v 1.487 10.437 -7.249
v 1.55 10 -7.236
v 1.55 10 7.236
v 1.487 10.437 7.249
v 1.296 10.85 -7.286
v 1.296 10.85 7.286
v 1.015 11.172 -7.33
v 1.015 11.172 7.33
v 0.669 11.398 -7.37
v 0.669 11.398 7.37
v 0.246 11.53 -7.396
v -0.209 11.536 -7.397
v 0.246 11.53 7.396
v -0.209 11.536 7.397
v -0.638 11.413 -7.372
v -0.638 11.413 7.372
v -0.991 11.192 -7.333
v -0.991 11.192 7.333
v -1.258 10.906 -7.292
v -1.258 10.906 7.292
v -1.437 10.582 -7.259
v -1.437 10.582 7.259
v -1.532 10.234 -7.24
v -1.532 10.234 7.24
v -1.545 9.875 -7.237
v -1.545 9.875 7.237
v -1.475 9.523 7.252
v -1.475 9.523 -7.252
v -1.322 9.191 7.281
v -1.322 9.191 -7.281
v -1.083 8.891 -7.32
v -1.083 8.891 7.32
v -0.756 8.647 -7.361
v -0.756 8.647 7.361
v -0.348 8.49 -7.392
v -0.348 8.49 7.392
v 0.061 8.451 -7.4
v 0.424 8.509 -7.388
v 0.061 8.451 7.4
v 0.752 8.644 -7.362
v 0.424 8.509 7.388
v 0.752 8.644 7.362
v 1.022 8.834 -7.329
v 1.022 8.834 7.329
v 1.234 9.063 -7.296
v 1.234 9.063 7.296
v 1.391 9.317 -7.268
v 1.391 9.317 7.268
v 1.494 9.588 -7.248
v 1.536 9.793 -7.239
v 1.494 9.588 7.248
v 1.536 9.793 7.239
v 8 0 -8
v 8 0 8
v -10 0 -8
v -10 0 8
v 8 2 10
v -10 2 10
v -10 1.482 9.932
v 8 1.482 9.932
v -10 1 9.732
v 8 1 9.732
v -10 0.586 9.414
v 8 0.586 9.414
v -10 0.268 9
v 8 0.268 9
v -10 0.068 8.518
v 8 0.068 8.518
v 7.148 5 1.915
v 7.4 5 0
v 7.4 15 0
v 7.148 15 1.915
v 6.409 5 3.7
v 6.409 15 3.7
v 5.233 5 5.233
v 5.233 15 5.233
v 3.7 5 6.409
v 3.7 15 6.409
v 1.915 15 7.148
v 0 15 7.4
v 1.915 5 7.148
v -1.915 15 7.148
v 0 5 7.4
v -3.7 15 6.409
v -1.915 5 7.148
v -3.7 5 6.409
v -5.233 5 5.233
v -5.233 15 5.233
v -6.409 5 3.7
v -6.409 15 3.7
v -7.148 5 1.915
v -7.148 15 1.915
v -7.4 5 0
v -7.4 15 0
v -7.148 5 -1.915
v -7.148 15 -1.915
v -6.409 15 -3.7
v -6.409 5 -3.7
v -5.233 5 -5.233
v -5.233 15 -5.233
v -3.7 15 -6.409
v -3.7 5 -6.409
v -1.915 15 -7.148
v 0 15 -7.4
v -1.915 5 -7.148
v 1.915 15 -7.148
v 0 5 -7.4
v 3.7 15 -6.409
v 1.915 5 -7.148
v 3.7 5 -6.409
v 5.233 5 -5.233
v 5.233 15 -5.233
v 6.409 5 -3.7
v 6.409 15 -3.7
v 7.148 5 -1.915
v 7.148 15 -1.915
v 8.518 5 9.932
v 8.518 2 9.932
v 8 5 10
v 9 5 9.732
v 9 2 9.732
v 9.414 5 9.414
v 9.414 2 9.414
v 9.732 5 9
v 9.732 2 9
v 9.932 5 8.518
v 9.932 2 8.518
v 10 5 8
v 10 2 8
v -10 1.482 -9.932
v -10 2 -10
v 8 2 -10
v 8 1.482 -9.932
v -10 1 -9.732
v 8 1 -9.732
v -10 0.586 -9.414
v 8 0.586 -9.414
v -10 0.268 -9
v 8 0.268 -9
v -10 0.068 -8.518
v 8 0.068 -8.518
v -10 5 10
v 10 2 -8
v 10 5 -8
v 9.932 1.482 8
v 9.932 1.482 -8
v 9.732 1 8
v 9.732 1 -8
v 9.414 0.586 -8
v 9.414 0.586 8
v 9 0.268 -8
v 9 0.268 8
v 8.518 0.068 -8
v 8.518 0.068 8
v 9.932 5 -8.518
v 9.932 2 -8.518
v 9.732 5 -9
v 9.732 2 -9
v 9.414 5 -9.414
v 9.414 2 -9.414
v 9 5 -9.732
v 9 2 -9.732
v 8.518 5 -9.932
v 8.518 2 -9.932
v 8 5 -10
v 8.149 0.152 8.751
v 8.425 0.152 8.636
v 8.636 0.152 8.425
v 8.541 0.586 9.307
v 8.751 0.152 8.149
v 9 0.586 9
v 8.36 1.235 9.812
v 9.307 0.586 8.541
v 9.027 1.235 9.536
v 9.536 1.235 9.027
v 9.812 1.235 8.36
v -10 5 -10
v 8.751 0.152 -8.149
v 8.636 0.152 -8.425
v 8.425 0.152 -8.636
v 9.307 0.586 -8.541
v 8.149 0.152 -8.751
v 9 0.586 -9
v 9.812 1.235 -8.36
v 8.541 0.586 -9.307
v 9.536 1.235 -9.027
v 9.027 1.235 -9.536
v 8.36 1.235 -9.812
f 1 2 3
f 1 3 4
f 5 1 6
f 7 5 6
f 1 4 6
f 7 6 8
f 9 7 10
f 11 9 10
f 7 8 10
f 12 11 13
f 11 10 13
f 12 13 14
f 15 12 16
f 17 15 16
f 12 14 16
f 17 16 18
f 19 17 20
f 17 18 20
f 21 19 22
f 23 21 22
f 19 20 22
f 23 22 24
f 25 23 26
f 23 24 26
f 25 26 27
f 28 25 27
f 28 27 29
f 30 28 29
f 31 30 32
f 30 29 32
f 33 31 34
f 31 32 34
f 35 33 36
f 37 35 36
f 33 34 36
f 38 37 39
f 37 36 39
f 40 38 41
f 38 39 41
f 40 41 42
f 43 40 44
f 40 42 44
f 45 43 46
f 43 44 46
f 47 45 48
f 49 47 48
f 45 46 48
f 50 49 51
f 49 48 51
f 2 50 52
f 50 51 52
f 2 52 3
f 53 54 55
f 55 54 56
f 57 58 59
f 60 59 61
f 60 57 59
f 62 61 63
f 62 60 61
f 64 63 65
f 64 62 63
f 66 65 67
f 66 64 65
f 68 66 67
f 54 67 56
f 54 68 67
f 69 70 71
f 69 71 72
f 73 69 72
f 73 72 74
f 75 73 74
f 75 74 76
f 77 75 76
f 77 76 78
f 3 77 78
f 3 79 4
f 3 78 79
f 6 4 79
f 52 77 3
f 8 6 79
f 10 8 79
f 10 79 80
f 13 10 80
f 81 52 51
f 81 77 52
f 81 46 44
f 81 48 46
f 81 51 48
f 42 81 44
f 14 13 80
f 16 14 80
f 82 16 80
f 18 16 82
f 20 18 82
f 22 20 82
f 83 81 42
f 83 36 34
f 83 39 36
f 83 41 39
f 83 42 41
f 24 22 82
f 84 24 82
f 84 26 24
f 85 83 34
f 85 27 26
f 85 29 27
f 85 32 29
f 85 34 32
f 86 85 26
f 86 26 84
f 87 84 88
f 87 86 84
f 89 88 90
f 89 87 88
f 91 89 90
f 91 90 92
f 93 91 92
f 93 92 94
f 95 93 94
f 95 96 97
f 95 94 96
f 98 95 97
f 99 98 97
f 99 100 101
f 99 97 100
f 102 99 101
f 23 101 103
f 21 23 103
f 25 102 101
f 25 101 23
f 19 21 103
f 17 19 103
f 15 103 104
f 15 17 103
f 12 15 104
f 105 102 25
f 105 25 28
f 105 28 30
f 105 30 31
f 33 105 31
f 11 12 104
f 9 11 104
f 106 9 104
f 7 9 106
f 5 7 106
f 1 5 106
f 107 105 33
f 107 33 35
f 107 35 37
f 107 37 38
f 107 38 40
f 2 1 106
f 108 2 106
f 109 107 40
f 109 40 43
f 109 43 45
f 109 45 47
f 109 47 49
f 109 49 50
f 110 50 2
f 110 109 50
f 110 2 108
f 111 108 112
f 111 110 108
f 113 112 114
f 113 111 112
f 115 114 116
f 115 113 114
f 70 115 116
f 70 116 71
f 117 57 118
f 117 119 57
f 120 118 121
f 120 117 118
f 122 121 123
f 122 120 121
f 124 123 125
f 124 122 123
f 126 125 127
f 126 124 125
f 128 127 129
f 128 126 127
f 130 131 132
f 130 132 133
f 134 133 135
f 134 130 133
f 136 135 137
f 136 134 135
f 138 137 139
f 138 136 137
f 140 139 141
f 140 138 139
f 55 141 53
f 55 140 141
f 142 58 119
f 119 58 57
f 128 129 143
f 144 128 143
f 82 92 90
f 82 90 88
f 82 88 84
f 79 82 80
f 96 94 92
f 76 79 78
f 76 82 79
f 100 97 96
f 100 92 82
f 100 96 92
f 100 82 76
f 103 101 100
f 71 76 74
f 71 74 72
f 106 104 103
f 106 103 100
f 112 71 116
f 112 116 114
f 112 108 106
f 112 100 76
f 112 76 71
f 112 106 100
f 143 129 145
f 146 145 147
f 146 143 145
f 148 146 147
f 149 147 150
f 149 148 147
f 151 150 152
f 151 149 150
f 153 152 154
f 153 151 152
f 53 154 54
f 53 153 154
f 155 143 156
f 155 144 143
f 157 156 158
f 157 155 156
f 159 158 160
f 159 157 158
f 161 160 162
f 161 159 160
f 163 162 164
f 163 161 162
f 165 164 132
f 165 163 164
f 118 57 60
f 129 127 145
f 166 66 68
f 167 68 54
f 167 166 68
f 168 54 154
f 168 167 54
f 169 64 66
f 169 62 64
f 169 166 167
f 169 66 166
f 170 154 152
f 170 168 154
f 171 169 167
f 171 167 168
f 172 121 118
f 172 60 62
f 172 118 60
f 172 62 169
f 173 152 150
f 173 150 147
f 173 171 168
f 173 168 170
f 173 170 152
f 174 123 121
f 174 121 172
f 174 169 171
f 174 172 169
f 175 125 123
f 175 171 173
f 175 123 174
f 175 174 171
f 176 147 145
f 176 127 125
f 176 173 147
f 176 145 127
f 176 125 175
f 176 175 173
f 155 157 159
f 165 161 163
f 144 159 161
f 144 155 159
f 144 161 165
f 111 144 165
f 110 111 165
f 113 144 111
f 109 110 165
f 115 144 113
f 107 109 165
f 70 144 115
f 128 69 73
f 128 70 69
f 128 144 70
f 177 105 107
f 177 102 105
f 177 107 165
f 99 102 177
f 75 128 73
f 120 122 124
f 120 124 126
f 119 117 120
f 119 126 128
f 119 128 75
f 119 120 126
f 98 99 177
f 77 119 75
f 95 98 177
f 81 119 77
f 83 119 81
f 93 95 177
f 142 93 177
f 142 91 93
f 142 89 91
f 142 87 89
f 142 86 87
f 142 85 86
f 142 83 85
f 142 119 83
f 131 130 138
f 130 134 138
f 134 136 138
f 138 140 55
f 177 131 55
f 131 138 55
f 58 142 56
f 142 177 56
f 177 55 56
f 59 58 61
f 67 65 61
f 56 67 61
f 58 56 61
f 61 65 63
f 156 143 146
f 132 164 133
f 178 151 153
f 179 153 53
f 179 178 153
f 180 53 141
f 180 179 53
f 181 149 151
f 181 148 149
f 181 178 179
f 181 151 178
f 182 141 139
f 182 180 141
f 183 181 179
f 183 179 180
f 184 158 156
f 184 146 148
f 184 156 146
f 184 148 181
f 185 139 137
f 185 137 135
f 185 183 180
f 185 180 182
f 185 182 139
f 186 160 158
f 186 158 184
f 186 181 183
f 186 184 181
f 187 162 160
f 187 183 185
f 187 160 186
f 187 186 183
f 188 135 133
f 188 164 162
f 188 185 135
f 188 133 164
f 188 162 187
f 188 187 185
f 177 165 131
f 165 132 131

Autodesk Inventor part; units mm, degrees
ref_plane "YZ Plane" through (0, 0, 0) normal (1, 0, 0) x (0, 1, 0)
ref_plane "XZ Plane" through (0, 0, 0) normal (0, 1, 0) x (-1, 0, 0)
ref_plane "XY Plane" through (0, 0, 0) normal (0, 0, 1) x (1, 0, 0)
sketch "Sketch1" plane through (0, 0, 0) normal (0, 1, 0) x (-1, 0, 0)
  line L0 (10, 10) -> (-10, 10)
  line L1 (-10, 10) -> (-10, -10)
  line L2 (-10, -10) -> (10, -10)
  line L3 (10, -10) -> (10, 10)
  line L4 (10, 10) -> (-10, -10) construction
  line L5 (-10, 10) -> (10, -10) construction
  point P0 (0, 0)
  dimension "d0" = 20
  dimension "d1" = 20
extrude "Extrusion1" add sketch "Sketch1" along normal blind 5
sketch "Sketch2" plane through (0, 5, 0) normal (0, 1, 0) x (1, 0, 0)
  circle A0 centre (0, 0) radius 7.4
  dimension "d4" = 14.8
extrude "Extrusion2" add sketch "Sketch2" along normal blind 10
sketch "Sketch3" plane through (-10, 0, 10) normal (0, 0, 1) x (1, 0, 0)
  circle A0 centre (10, 10) radius 1.55
  line L0 (0, 5) -> (20, 5) projected
  point P0 (10, 0)
  dimension "d7" = 3.1
  dimension "d8" = 5
extrude "Extrusion3" cut sketch "Sketch3" against normal through all
fillet "Fillet1" radius 2 5 edges at (10, 2.5, 10) (10, 2.5, -10) (0, 0, 10) (10, 0, 0) (0, 0, -10)
properties part number "finger2+" material "ABS Plastic"
